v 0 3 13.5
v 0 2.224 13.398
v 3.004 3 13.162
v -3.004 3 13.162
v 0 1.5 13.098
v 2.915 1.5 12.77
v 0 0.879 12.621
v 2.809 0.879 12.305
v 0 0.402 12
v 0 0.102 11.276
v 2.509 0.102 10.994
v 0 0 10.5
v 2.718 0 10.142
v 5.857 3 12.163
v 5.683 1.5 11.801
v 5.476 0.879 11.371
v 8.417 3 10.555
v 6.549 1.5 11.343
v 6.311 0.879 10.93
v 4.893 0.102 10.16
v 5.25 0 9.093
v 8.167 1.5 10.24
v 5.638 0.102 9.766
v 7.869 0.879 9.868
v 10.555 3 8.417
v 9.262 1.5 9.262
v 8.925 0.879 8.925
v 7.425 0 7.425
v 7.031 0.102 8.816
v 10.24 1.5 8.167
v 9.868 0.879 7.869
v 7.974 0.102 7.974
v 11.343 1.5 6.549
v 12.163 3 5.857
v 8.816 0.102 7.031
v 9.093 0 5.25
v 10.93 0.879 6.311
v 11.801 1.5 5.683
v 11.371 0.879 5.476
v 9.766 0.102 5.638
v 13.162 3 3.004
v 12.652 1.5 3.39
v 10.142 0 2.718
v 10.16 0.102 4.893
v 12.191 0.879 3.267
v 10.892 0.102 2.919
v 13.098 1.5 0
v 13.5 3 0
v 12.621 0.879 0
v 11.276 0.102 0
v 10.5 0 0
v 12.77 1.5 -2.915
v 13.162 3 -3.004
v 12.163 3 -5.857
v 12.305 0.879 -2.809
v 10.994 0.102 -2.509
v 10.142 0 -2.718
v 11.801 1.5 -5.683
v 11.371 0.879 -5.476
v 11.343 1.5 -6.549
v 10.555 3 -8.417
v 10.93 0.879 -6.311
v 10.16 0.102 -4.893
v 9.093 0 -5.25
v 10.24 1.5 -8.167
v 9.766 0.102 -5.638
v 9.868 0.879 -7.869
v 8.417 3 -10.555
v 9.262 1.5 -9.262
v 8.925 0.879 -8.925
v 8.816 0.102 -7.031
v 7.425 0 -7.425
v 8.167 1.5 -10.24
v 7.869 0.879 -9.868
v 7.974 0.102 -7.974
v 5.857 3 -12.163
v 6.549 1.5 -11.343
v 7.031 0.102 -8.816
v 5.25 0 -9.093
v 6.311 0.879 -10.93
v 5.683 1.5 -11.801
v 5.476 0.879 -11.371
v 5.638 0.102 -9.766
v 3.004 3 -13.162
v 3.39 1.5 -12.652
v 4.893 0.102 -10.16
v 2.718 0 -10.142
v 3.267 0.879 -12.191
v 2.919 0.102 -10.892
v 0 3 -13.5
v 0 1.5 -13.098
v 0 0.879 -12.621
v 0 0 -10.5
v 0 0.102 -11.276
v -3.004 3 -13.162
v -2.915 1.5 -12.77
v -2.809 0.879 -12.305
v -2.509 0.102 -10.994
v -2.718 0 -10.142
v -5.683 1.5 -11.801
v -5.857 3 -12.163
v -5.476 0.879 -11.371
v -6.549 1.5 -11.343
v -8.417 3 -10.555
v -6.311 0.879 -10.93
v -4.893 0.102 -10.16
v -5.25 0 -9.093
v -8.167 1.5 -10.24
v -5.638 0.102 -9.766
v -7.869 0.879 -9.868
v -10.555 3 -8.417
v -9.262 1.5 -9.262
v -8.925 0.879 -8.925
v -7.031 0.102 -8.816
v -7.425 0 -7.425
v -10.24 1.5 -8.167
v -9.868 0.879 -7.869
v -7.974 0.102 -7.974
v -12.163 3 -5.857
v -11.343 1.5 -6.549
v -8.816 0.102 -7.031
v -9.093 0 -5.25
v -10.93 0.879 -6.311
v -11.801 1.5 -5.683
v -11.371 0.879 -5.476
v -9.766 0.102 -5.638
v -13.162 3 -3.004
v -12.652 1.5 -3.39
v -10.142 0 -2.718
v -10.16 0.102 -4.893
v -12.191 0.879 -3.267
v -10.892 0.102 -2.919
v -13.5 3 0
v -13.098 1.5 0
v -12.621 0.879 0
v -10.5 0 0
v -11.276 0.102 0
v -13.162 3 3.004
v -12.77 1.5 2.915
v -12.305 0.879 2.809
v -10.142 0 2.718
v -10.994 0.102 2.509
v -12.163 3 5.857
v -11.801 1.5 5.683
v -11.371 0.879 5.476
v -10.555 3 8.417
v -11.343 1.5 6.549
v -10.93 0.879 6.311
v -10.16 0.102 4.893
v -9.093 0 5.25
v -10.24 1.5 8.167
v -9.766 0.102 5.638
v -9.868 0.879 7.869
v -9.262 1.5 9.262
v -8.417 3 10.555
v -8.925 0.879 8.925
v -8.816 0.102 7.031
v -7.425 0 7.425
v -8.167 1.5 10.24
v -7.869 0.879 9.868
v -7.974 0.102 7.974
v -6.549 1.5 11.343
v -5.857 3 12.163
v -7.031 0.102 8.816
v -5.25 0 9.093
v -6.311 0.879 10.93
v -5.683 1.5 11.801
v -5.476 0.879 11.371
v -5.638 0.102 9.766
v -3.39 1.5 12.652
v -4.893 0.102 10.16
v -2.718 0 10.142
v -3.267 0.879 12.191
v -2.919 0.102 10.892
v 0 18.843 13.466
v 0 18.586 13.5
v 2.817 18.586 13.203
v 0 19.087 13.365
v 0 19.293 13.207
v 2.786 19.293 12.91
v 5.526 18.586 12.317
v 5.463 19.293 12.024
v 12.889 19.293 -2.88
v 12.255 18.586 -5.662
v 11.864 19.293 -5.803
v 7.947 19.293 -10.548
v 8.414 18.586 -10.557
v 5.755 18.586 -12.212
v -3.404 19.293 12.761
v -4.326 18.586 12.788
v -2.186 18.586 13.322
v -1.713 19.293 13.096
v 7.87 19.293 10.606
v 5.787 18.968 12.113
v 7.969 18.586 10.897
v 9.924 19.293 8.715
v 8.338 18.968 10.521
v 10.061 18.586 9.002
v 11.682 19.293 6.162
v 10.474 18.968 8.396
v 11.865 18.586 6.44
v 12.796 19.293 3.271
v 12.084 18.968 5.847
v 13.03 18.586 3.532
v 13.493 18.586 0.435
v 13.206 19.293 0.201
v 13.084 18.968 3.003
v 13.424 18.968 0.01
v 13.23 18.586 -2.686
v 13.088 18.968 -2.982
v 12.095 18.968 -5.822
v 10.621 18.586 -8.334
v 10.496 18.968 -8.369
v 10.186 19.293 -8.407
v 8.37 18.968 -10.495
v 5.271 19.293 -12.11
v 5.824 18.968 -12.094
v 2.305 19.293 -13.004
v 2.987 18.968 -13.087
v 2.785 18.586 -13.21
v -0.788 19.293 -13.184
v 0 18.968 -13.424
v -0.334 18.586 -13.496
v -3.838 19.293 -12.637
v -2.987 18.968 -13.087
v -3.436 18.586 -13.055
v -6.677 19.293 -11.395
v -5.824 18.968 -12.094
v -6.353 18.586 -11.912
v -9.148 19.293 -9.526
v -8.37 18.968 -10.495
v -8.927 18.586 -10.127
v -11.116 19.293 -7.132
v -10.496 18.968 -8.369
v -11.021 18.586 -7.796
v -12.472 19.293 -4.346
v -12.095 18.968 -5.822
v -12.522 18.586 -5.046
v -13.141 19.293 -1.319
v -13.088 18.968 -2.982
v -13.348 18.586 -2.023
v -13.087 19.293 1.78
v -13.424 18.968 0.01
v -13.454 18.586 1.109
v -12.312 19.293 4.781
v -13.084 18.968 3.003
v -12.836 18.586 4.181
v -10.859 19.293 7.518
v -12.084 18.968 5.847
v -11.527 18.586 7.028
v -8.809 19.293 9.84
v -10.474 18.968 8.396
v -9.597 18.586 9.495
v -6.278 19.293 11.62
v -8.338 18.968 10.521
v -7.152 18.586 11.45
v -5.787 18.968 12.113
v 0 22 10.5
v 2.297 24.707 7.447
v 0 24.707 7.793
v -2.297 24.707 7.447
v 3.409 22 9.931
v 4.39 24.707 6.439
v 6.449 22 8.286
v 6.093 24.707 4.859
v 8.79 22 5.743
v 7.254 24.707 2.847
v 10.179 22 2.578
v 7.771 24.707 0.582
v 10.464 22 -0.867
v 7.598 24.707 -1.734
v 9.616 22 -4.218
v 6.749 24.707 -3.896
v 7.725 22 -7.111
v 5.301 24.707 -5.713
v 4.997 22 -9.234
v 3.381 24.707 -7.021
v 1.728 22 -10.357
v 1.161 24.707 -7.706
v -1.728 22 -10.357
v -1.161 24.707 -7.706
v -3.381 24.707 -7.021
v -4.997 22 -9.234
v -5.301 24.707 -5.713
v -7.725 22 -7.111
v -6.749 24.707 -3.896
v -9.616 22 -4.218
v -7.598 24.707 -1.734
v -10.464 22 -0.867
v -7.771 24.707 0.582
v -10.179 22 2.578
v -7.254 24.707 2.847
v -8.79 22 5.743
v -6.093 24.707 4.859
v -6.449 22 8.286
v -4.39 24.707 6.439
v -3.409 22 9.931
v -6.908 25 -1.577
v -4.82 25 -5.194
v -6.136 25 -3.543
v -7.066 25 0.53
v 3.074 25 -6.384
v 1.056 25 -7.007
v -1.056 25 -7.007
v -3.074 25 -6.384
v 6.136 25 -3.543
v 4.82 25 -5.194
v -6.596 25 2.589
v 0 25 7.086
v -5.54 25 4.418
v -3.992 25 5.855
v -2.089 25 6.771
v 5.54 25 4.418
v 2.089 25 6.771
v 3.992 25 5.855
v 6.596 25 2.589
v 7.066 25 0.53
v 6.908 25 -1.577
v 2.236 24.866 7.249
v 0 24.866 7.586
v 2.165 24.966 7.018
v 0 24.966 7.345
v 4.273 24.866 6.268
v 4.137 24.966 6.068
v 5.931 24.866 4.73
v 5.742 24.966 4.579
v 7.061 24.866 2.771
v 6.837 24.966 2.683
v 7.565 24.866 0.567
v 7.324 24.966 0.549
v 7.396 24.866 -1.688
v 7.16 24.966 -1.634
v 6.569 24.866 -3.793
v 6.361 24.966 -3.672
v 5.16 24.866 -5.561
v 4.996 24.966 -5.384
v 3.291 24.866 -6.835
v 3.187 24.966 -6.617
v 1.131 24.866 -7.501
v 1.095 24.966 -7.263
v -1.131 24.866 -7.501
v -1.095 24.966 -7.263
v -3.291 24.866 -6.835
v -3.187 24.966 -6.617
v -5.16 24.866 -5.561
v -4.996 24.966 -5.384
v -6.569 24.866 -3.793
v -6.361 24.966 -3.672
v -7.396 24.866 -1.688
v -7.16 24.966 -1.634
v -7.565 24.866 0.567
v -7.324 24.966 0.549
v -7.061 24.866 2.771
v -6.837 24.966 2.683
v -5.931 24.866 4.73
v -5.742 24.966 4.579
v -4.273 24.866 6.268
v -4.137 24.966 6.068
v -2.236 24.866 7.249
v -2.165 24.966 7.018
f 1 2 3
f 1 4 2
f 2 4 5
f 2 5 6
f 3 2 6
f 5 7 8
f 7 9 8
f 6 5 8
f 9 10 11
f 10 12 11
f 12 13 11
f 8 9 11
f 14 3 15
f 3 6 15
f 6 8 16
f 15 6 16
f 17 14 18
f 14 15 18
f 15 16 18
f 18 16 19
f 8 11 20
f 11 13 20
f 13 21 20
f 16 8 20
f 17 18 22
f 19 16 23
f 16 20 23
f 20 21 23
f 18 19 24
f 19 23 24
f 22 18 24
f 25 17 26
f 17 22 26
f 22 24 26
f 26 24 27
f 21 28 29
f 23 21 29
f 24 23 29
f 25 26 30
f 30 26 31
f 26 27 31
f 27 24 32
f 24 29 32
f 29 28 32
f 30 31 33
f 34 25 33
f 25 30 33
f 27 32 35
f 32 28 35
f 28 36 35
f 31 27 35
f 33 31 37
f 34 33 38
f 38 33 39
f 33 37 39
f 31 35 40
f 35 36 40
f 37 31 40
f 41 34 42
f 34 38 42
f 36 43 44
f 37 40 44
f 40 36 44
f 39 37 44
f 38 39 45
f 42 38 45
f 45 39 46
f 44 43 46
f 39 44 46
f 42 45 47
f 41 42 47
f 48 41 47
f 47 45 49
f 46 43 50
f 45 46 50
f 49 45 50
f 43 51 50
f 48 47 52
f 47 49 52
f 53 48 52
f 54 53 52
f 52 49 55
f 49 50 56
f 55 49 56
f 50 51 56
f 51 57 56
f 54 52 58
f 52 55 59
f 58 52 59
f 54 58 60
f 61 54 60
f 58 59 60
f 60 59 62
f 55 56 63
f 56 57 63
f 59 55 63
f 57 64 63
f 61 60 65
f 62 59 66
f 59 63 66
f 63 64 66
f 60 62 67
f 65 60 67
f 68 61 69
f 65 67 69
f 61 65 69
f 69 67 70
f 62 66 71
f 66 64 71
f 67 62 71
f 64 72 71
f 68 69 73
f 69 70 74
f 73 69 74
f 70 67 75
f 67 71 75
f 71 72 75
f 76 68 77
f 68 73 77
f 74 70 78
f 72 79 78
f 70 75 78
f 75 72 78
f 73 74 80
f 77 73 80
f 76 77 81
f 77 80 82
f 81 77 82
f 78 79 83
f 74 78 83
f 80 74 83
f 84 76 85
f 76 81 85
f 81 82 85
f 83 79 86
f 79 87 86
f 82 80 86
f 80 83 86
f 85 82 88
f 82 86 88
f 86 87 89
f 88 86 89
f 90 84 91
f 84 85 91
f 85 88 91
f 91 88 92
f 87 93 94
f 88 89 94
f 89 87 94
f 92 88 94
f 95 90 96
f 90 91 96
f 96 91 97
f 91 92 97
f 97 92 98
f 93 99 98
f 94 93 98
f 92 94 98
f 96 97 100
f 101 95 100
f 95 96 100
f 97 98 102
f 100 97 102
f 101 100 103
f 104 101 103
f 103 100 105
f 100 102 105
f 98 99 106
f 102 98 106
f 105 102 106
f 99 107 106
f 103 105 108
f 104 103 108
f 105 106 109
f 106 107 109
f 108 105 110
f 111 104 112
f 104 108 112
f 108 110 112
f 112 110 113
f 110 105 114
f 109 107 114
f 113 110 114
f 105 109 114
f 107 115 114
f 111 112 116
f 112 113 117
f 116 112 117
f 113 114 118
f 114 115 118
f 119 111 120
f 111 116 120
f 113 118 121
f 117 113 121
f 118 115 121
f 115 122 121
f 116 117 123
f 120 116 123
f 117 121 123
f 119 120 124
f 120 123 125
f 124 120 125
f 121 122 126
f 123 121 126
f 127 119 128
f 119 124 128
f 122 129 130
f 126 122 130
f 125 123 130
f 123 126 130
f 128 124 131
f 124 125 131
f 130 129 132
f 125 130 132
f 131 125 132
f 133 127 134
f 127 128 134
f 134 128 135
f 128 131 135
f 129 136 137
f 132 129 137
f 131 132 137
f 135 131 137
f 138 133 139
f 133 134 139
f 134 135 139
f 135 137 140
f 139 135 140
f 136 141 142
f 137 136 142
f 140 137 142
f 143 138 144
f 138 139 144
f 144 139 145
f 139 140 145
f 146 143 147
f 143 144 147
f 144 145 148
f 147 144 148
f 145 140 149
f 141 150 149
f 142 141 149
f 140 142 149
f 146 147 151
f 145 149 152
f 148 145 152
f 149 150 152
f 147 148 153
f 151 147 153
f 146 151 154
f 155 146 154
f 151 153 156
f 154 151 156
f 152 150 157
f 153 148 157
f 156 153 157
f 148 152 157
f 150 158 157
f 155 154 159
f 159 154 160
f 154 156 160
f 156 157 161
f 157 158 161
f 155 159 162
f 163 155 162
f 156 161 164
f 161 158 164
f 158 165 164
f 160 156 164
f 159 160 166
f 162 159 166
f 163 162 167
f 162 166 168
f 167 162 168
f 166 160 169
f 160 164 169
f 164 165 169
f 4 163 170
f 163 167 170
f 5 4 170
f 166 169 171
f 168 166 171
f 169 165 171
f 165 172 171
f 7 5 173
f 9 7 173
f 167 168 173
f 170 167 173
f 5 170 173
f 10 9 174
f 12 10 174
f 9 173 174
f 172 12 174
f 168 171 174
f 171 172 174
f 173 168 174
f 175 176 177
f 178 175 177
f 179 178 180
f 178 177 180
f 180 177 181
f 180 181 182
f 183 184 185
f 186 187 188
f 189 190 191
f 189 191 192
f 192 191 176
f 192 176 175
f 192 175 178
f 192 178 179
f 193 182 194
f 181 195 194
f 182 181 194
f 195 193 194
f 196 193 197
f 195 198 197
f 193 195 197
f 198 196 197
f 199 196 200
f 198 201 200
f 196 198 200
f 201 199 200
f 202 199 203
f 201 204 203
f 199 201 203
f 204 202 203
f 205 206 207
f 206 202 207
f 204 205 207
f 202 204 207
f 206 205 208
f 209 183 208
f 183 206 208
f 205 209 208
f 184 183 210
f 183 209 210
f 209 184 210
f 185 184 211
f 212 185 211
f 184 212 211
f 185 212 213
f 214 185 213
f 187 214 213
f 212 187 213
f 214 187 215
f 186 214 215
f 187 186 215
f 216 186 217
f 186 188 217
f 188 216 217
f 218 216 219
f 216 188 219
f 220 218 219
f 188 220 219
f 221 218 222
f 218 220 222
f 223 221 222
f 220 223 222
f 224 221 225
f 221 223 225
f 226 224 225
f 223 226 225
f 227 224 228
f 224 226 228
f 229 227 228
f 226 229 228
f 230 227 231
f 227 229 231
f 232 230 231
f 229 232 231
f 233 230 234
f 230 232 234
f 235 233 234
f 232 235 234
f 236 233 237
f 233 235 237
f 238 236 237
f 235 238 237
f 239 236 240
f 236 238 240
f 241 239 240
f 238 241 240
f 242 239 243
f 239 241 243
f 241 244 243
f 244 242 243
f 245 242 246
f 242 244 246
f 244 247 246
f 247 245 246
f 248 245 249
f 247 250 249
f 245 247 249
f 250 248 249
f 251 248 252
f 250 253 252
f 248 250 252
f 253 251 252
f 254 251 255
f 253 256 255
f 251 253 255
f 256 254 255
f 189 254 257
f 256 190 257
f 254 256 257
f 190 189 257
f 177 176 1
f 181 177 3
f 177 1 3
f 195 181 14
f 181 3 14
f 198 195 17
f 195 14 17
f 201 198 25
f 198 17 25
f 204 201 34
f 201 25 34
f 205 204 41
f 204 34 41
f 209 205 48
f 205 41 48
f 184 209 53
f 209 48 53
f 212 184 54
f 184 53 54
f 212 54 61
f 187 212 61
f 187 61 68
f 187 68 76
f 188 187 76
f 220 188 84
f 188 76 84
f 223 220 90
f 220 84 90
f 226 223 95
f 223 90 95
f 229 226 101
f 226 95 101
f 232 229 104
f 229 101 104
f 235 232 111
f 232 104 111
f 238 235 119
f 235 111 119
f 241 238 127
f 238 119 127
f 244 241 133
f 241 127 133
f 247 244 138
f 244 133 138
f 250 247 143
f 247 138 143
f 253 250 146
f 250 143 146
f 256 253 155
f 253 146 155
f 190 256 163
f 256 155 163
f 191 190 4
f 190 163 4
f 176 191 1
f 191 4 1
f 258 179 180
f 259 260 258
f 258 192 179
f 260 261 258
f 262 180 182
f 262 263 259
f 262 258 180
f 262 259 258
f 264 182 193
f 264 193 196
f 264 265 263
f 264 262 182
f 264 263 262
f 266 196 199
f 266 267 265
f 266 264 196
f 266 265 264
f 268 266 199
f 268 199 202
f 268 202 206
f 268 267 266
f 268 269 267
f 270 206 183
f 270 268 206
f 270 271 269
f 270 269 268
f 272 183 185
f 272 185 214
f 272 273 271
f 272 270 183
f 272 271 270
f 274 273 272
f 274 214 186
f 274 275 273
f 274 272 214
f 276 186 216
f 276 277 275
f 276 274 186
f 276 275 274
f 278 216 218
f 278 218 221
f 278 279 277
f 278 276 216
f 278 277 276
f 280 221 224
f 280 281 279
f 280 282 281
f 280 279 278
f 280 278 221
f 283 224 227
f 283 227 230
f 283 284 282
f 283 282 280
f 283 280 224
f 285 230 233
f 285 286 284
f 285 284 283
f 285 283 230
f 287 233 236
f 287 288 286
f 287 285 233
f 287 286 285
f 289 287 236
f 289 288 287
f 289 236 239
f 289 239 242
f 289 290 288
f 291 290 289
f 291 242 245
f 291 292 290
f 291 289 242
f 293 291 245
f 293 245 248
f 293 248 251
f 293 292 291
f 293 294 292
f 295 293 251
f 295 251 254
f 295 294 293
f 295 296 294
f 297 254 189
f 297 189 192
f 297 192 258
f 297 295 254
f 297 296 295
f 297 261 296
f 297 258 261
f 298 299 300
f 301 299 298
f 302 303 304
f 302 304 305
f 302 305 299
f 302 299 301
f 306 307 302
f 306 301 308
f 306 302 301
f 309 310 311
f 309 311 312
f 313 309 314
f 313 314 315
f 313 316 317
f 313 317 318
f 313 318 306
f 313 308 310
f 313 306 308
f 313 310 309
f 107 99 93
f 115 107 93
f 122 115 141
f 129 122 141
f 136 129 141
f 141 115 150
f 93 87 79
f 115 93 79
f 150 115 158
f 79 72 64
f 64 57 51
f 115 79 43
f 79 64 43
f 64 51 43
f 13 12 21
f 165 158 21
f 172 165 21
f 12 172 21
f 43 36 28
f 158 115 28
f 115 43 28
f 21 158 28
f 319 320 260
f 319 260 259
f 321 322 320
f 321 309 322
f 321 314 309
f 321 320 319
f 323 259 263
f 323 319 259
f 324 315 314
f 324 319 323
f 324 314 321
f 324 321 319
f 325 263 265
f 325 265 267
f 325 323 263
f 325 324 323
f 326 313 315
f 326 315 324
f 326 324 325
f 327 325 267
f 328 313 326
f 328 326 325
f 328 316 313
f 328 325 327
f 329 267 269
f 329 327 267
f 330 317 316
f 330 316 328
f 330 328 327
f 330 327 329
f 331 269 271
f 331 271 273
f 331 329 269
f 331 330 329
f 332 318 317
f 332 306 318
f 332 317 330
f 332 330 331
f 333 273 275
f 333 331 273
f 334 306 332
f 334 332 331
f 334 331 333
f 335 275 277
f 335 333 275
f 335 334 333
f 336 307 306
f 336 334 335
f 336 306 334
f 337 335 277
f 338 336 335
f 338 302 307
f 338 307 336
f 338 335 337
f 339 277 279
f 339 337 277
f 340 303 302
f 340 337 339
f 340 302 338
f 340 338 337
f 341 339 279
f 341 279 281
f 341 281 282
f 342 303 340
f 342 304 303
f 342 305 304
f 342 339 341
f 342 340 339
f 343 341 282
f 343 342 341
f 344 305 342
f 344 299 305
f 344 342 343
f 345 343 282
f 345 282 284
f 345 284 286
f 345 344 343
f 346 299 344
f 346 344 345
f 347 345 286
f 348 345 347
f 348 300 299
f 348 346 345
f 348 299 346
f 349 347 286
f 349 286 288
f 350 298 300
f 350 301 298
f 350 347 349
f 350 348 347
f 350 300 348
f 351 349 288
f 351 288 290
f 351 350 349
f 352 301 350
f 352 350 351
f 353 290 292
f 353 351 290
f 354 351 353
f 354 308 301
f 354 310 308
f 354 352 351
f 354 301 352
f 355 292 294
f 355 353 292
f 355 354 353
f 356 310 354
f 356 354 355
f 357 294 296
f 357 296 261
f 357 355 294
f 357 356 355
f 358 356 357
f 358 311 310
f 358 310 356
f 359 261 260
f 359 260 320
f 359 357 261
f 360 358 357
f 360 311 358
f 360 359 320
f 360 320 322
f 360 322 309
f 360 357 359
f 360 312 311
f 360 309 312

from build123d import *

# Parameters (mm, degrees)
SKETCH1_R           = 13.5
BOSS_EXTRUDE1_DEPTH = 25
CHAMFER1_SIZE       = 6
FILLET1_R           = 3
FILLET2_R           = 1


with BuildPart() as part:
    # Sketch1 → Boss-Extrude1 (new body)
    with BuildSketch(Plane(origin=(0, 0, 0), x_dir=(1, 0, 0), z_dir=(0, 1, 0))):
        with Locations(Location((0, 0, 0), (0, 0, 270))):
            Circle(SKETCH1_R)
    extrude(amount=BOSS_EXTRUDE1_DEPTH)

    # Chamfer1
    chamfer1_edges = [part.edges().sort_by_distance(p)[0] for p in [
        (0, 25, -13.5),
    ]]
    chamfer(chamfer1_edges, length=CHAMFER1_SIZE)

    # Fillet1
    fillet1_edges = [part.edges().sort_by_distance(p)[0] for p in [
        (0, 0, -13.5),
    ]]
    fillet(fillet1_edges, radius=FILLET1_R)

    # Fillet2
    fillet2_edges = [part.edges().sort_by_distance(p)[0] for p in [
        (0, 25, -7.5),
        (0, 19, -13.5),
    ]]
    fillet(fillet2_edges, radius=FILLET2_R)


solid = part.part
